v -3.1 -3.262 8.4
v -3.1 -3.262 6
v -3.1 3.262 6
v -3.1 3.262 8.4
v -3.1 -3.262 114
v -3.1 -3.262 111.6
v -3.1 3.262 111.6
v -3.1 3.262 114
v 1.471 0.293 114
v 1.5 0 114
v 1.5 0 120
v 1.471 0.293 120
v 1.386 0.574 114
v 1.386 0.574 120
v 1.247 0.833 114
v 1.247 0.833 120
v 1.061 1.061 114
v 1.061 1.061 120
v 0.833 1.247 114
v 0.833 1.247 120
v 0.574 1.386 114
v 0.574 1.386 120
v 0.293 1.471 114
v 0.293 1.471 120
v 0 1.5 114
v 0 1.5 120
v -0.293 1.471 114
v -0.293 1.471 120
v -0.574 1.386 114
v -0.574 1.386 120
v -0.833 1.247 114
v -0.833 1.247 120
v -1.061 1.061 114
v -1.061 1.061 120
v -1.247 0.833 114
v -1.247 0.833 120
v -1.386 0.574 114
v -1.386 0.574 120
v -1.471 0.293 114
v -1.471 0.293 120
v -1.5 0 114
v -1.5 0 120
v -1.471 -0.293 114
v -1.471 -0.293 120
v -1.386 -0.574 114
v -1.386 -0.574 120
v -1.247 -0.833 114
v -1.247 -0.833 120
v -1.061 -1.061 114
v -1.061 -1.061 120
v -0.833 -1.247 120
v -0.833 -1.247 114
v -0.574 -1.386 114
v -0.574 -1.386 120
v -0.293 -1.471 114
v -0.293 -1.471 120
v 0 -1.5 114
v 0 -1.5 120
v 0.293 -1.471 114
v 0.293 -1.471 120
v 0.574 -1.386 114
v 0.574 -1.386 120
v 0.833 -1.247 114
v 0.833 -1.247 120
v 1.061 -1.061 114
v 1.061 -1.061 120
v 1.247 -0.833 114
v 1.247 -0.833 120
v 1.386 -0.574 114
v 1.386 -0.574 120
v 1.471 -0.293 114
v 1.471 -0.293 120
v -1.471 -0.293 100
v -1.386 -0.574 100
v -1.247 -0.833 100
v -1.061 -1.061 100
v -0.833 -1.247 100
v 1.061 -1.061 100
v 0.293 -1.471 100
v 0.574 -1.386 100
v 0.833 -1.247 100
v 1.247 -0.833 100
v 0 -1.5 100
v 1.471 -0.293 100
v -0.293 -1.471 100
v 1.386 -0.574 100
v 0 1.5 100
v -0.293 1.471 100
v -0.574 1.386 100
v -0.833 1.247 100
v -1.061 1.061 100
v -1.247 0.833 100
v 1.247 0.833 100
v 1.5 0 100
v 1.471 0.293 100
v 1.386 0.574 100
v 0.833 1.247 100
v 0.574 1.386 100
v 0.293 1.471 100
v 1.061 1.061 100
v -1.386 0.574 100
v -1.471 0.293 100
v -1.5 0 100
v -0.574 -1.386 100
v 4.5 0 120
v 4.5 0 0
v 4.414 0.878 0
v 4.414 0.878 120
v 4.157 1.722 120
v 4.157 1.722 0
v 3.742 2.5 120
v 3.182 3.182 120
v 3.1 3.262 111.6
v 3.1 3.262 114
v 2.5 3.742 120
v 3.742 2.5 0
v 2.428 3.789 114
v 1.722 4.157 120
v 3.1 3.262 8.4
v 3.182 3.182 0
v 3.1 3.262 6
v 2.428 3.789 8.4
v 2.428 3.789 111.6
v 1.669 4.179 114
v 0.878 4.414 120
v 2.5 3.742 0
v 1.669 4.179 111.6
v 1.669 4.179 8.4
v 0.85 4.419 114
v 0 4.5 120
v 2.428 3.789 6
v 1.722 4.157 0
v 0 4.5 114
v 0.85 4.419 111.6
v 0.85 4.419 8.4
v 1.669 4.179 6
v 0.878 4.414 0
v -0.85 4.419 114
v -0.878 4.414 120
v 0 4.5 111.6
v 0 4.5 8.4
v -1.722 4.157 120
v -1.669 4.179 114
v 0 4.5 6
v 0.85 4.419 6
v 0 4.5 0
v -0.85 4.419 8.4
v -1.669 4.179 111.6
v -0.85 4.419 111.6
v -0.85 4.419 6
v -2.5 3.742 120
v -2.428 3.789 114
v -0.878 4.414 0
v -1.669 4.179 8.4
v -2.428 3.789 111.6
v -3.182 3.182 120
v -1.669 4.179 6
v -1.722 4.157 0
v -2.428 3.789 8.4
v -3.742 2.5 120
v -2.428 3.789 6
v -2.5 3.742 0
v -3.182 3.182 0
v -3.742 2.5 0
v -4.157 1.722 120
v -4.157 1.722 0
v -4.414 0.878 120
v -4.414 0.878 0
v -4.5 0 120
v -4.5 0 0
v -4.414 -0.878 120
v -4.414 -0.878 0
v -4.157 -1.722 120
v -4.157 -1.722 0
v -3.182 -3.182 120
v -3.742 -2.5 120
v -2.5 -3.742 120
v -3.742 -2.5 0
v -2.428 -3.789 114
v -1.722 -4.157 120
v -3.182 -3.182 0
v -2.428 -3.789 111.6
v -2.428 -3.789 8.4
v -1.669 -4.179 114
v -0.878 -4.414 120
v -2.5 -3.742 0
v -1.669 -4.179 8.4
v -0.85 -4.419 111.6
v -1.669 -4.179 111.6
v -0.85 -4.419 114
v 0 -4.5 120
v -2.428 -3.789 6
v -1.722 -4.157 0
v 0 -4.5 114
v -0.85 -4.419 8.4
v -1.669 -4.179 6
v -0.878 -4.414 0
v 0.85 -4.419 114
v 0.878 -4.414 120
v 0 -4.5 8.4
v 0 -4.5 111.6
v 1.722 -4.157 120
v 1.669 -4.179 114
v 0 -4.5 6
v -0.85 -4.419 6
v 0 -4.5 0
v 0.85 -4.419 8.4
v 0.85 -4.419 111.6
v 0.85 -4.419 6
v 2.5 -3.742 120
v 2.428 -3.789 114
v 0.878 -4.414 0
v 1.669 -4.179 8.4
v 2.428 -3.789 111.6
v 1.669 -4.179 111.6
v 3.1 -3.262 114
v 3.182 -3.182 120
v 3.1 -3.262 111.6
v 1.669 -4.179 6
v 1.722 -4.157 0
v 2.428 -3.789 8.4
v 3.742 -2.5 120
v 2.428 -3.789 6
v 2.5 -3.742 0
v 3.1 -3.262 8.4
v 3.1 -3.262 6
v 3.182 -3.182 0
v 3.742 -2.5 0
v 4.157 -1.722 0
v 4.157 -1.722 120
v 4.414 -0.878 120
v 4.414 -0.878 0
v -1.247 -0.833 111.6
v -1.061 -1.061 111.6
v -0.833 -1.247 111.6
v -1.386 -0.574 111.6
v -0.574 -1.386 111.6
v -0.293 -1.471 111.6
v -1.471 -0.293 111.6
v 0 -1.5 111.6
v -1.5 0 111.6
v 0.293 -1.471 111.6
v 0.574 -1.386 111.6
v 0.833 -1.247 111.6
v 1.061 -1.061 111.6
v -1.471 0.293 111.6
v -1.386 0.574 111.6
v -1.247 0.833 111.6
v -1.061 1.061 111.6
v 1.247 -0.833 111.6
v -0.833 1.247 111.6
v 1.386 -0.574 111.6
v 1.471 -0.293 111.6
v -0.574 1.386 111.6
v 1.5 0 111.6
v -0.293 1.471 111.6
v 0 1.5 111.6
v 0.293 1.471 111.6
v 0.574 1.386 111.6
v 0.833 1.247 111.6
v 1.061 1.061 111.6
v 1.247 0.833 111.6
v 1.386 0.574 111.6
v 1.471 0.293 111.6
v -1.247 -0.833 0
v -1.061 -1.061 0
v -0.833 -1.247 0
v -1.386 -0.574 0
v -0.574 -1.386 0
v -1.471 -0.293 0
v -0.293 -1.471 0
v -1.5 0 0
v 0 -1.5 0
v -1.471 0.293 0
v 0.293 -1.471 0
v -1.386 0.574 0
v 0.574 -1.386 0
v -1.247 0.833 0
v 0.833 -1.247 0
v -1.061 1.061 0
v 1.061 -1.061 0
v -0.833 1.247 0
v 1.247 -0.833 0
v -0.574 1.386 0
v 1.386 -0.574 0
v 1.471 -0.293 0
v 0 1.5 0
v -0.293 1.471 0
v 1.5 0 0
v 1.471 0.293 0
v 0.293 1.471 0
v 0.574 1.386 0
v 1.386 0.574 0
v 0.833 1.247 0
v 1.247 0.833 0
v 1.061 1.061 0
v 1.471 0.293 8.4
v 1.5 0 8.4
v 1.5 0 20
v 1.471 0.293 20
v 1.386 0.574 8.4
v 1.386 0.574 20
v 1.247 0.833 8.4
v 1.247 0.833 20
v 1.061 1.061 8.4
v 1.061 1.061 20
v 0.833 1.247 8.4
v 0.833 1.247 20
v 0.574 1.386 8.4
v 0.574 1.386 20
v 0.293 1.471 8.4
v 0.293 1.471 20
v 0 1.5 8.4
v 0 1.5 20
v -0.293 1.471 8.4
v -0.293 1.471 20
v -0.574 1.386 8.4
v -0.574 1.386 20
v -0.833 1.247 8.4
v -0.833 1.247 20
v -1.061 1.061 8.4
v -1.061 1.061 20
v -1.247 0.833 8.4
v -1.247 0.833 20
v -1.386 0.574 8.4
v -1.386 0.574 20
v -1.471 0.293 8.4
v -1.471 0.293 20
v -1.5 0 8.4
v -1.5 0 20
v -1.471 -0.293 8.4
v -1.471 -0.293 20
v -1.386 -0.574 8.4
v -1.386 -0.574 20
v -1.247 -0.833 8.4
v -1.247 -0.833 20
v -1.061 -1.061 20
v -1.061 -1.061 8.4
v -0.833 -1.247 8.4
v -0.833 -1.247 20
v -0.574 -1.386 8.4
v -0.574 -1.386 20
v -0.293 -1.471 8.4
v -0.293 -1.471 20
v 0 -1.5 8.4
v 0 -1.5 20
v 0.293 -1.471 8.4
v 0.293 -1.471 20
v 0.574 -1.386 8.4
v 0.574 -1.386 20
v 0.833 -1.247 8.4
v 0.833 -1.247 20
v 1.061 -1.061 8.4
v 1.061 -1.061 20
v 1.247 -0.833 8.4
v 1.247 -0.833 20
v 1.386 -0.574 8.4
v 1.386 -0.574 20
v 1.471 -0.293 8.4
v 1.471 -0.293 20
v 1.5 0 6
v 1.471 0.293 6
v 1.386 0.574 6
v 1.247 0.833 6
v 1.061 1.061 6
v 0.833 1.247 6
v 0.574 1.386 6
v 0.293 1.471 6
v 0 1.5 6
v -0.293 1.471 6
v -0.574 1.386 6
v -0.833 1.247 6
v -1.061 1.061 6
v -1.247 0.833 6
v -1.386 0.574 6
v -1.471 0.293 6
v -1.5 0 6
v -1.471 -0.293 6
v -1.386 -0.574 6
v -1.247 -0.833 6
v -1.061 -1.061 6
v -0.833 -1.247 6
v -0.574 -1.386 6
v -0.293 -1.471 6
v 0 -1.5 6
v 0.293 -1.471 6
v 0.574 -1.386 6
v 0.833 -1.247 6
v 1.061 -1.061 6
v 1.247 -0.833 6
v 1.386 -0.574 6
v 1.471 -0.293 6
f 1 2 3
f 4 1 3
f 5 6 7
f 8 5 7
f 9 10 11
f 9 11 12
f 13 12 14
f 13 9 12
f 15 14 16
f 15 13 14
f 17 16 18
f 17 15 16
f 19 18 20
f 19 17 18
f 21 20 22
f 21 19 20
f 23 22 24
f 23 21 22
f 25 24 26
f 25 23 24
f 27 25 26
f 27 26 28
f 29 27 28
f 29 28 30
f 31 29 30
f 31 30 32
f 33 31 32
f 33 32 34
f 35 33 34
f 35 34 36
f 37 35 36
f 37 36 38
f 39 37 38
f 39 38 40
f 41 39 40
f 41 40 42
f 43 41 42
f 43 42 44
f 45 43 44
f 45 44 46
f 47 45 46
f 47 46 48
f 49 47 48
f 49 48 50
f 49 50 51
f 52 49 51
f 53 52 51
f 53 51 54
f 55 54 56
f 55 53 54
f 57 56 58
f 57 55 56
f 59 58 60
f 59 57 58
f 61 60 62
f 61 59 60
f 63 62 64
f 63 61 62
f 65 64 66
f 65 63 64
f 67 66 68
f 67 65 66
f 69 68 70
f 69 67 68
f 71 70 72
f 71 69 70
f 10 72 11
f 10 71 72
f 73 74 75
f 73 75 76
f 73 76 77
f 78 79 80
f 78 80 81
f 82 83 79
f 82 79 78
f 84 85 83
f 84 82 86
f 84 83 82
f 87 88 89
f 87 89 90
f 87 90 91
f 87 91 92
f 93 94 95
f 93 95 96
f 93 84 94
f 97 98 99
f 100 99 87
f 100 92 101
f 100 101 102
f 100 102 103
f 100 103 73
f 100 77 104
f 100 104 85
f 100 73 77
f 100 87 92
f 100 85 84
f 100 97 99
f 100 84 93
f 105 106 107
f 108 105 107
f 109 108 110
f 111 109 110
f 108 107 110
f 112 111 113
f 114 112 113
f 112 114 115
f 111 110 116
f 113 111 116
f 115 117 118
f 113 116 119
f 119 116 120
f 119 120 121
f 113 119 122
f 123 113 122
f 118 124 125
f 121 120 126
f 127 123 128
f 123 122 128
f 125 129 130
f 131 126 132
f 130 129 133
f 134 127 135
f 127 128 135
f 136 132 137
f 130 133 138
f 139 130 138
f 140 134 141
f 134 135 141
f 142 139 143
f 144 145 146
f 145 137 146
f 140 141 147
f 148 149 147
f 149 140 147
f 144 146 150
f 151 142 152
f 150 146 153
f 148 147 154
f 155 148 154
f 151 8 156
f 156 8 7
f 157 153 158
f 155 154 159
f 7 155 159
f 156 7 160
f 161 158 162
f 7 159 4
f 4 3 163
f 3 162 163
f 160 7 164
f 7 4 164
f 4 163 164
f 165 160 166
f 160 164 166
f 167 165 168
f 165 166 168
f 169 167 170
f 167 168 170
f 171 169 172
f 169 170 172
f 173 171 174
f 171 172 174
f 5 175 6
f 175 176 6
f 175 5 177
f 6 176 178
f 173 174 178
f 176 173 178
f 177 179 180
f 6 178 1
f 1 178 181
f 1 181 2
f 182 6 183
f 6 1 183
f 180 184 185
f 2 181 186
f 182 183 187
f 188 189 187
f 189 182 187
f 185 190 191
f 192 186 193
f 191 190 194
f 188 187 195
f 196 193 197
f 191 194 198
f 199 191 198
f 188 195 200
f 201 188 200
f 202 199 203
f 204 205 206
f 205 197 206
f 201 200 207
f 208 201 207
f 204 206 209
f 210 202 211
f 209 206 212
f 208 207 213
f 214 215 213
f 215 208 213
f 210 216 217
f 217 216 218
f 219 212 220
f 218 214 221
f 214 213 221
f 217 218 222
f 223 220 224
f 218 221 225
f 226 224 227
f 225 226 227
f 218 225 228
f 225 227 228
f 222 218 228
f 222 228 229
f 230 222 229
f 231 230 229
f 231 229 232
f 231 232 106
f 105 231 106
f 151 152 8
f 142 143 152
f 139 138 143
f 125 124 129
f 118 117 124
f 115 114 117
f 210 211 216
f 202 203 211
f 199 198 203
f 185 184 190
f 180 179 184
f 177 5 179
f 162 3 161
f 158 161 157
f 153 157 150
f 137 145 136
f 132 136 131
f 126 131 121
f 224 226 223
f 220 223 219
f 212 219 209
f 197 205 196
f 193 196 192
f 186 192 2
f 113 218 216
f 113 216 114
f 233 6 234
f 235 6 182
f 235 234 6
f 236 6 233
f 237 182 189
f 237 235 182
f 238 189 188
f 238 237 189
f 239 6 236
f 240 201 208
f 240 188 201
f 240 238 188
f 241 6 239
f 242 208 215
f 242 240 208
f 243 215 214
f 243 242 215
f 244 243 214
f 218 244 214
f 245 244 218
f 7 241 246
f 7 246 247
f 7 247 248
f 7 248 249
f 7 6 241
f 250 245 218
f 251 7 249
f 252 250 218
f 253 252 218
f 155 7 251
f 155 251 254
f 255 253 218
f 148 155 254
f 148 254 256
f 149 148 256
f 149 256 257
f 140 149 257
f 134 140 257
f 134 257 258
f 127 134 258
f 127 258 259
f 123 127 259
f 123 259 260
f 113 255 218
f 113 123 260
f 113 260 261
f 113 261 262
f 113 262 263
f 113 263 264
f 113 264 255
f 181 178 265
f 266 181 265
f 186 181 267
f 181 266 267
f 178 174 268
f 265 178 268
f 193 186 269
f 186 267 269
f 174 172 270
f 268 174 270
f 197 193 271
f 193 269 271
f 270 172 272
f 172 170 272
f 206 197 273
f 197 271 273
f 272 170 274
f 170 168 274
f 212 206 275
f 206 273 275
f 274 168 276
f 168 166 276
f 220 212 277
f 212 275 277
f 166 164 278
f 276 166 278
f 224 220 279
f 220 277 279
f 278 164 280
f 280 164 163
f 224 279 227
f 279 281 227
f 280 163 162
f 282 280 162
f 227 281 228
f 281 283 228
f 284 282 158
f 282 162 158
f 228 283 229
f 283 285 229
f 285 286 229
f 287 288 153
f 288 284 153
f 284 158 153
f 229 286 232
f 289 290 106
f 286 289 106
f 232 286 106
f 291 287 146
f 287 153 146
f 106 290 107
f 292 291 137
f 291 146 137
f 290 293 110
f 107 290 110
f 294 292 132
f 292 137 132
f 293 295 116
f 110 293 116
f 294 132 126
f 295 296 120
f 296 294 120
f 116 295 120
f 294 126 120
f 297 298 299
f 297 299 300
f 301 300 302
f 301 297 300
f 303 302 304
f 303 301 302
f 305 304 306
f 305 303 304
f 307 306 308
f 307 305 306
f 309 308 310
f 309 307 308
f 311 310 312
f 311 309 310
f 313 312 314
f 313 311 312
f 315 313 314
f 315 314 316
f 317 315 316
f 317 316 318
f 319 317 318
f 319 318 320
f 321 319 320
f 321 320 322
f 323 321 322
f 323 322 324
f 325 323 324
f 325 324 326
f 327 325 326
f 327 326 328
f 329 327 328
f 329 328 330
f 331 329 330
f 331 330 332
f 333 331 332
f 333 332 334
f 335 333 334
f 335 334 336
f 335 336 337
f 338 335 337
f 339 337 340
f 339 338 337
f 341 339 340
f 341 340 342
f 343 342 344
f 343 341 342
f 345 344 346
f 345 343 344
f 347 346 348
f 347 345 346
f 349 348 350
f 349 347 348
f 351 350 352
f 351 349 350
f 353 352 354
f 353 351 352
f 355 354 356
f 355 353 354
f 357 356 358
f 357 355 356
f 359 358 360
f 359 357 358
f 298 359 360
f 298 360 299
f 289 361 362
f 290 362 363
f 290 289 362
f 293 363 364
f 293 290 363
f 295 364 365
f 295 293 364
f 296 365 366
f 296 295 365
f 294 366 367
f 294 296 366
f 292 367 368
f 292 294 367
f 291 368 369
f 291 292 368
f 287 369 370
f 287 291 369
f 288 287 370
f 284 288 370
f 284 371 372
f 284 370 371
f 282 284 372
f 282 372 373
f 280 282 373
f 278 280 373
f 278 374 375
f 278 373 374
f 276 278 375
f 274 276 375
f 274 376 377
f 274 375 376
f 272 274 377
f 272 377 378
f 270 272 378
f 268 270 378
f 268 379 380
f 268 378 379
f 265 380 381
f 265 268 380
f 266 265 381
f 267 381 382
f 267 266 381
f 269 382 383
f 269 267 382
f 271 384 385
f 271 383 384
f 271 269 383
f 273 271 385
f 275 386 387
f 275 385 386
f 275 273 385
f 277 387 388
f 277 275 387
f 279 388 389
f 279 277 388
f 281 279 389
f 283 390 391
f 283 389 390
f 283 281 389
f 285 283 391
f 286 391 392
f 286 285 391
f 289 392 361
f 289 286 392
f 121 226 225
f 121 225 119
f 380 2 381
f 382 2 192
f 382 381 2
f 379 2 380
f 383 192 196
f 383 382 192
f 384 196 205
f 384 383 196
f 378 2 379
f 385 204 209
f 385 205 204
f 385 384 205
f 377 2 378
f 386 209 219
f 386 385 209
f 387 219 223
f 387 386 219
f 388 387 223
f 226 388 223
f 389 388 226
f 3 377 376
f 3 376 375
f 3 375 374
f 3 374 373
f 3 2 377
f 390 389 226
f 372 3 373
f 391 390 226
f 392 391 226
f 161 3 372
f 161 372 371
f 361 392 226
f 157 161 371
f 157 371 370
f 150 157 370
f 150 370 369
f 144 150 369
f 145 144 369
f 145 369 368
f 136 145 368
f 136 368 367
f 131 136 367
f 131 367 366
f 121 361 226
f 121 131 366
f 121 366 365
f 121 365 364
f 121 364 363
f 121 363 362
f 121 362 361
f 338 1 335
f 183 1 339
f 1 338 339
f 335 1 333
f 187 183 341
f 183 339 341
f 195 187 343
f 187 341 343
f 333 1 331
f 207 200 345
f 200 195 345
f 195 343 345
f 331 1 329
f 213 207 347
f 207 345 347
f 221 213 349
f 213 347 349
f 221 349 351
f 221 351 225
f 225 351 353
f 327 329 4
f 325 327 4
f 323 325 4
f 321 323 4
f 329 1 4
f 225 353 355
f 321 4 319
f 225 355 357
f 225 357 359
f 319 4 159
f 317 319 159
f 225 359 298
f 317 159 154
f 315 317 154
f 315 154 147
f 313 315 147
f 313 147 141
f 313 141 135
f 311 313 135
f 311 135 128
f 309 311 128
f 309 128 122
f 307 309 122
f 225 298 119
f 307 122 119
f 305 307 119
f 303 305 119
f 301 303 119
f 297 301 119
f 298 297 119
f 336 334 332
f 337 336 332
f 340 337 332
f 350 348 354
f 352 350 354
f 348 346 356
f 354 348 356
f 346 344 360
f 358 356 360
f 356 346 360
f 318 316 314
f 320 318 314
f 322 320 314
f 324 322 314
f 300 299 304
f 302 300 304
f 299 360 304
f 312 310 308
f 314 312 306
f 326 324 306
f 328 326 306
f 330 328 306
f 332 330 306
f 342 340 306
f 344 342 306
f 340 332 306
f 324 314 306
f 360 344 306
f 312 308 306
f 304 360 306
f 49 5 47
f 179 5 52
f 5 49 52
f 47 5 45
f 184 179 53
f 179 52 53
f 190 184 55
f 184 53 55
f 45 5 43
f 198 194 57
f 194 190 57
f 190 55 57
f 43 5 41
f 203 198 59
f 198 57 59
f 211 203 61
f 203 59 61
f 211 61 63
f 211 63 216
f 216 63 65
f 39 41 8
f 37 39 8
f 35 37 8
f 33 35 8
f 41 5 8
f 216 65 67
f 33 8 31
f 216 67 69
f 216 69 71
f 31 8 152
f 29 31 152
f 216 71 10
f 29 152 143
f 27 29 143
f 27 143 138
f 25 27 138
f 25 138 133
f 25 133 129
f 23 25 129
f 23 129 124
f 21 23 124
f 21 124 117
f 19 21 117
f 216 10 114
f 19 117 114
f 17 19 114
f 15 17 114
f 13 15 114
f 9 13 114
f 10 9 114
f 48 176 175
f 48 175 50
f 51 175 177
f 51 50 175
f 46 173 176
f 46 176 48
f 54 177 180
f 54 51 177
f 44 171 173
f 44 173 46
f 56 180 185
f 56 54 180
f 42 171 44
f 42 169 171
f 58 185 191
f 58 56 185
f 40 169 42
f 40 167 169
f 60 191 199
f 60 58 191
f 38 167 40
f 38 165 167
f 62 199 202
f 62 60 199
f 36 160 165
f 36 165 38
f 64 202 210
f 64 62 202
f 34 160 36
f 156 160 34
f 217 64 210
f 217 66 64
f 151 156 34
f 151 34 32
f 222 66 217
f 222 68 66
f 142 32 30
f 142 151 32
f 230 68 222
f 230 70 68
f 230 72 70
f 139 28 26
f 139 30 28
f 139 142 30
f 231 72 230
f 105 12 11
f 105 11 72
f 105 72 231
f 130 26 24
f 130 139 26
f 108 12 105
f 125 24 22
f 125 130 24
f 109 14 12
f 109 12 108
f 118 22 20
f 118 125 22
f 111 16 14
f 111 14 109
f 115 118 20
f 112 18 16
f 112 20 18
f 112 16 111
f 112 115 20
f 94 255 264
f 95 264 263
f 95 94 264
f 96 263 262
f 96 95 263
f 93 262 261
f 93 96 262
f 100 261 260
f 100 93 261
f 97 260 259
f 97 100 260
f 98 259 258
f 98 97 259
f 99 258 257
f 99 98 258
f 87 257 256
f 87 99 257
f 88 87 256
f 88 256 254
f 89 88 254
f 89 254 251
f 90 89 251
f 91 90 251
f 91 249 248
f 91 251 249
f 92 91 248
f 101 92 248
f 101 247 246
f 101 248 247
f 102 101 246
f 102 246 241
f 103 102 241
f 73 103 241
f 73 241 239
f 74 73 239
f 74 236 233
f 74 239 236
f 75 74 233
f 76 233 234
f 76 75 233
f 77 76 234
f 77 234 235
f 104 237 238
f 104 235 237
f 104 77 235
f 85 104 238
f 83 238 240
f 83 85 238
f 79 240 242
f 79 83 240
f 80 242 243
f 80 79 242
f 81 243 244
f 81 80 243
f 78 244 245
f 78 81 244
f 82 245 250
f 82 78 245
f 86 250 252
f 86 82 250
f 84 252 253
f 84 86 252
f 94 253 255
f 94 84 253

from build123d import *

# Parameters (mm, degrees)
BOX010_W          = 6.2
BOX010_H          = 10
BOX010_DEPTH      = 2.4
BOX011_W          = 6.2
BOX011_H          = 10
BOX011_DEPTH      = 2.4
CYLINDER008_R     = 1.5
CYLINDER008_DEPTH = 20
CYLINDER007_R     = 1.5
CYLINDER007_DEPTH = 20
CYLINDER006_R     = 4.5
CYLINDER006_DEPTH = 120


with BuildPart() as nut1:
    # Box010 → Box010 (new body)
    with BuildSketch(Plane(origin=(-3.1, -5, 6), x_dir=(1, 0, 0), z_dir=(0, 0, 1))):
        with Locations((3.1, 5)):
            Rectangle(BOX010_W, BOX010_H)
    extrude(amount=BOX010_DEPTH)


with BuildPart() as nut2:
    # Box011 → Box011 (new body)
    with BuildSketch(Plane(origin=(-3.1, -5, 111.6), x_dir=(1, 0, 0), z_dir=(0, 0, 1))):
        with Locations((3.1, 5)):
            Rectangle(BOX011_W, BOX011_H)
    extrude(amount=BOX011_DEPTH)


with BuildPart() as columnhole2:
    # Cylinder008 → Cylinder008 (new body)
    with BuildSketch(Plane.XY.offset(100)):
        Circle(CYLINDER008_R)
    extrude(amount=CYLINDER008_DEPTH)


with BuildPart() as columnhole1:
    # Cylinder007 → Cylinder007 (new body)
    with BuildSketch(Plane.XY):
        Circle(CYLINDER007_R)
    extrude(amount=CYLINDER007_DEPTH)


with BuildPart() as column:
    # Cylinder006 → Cylinder006 (new body)
    with BuildSketch(Plane.XY):
        Circle(CYLINDER006_R)
    extrude(amount=CYLINDER006_DEPTH)

    # Cut010: cut ColumnHole1
    add(columnhole1.part, mode=Mode.SUBTRACT)

    # Cut011: cut ColumnHole2
    add(columnhole2.part, mode=Mode.SUBTRACT)

    # Cut012: cut Nut2
    add(nut2.part, mode=Mode.SUBTRACT)

    # Cut013: cut Nut1
    add(nut1.part, mode=Mode.SUBTRACT)


solid = column.part
